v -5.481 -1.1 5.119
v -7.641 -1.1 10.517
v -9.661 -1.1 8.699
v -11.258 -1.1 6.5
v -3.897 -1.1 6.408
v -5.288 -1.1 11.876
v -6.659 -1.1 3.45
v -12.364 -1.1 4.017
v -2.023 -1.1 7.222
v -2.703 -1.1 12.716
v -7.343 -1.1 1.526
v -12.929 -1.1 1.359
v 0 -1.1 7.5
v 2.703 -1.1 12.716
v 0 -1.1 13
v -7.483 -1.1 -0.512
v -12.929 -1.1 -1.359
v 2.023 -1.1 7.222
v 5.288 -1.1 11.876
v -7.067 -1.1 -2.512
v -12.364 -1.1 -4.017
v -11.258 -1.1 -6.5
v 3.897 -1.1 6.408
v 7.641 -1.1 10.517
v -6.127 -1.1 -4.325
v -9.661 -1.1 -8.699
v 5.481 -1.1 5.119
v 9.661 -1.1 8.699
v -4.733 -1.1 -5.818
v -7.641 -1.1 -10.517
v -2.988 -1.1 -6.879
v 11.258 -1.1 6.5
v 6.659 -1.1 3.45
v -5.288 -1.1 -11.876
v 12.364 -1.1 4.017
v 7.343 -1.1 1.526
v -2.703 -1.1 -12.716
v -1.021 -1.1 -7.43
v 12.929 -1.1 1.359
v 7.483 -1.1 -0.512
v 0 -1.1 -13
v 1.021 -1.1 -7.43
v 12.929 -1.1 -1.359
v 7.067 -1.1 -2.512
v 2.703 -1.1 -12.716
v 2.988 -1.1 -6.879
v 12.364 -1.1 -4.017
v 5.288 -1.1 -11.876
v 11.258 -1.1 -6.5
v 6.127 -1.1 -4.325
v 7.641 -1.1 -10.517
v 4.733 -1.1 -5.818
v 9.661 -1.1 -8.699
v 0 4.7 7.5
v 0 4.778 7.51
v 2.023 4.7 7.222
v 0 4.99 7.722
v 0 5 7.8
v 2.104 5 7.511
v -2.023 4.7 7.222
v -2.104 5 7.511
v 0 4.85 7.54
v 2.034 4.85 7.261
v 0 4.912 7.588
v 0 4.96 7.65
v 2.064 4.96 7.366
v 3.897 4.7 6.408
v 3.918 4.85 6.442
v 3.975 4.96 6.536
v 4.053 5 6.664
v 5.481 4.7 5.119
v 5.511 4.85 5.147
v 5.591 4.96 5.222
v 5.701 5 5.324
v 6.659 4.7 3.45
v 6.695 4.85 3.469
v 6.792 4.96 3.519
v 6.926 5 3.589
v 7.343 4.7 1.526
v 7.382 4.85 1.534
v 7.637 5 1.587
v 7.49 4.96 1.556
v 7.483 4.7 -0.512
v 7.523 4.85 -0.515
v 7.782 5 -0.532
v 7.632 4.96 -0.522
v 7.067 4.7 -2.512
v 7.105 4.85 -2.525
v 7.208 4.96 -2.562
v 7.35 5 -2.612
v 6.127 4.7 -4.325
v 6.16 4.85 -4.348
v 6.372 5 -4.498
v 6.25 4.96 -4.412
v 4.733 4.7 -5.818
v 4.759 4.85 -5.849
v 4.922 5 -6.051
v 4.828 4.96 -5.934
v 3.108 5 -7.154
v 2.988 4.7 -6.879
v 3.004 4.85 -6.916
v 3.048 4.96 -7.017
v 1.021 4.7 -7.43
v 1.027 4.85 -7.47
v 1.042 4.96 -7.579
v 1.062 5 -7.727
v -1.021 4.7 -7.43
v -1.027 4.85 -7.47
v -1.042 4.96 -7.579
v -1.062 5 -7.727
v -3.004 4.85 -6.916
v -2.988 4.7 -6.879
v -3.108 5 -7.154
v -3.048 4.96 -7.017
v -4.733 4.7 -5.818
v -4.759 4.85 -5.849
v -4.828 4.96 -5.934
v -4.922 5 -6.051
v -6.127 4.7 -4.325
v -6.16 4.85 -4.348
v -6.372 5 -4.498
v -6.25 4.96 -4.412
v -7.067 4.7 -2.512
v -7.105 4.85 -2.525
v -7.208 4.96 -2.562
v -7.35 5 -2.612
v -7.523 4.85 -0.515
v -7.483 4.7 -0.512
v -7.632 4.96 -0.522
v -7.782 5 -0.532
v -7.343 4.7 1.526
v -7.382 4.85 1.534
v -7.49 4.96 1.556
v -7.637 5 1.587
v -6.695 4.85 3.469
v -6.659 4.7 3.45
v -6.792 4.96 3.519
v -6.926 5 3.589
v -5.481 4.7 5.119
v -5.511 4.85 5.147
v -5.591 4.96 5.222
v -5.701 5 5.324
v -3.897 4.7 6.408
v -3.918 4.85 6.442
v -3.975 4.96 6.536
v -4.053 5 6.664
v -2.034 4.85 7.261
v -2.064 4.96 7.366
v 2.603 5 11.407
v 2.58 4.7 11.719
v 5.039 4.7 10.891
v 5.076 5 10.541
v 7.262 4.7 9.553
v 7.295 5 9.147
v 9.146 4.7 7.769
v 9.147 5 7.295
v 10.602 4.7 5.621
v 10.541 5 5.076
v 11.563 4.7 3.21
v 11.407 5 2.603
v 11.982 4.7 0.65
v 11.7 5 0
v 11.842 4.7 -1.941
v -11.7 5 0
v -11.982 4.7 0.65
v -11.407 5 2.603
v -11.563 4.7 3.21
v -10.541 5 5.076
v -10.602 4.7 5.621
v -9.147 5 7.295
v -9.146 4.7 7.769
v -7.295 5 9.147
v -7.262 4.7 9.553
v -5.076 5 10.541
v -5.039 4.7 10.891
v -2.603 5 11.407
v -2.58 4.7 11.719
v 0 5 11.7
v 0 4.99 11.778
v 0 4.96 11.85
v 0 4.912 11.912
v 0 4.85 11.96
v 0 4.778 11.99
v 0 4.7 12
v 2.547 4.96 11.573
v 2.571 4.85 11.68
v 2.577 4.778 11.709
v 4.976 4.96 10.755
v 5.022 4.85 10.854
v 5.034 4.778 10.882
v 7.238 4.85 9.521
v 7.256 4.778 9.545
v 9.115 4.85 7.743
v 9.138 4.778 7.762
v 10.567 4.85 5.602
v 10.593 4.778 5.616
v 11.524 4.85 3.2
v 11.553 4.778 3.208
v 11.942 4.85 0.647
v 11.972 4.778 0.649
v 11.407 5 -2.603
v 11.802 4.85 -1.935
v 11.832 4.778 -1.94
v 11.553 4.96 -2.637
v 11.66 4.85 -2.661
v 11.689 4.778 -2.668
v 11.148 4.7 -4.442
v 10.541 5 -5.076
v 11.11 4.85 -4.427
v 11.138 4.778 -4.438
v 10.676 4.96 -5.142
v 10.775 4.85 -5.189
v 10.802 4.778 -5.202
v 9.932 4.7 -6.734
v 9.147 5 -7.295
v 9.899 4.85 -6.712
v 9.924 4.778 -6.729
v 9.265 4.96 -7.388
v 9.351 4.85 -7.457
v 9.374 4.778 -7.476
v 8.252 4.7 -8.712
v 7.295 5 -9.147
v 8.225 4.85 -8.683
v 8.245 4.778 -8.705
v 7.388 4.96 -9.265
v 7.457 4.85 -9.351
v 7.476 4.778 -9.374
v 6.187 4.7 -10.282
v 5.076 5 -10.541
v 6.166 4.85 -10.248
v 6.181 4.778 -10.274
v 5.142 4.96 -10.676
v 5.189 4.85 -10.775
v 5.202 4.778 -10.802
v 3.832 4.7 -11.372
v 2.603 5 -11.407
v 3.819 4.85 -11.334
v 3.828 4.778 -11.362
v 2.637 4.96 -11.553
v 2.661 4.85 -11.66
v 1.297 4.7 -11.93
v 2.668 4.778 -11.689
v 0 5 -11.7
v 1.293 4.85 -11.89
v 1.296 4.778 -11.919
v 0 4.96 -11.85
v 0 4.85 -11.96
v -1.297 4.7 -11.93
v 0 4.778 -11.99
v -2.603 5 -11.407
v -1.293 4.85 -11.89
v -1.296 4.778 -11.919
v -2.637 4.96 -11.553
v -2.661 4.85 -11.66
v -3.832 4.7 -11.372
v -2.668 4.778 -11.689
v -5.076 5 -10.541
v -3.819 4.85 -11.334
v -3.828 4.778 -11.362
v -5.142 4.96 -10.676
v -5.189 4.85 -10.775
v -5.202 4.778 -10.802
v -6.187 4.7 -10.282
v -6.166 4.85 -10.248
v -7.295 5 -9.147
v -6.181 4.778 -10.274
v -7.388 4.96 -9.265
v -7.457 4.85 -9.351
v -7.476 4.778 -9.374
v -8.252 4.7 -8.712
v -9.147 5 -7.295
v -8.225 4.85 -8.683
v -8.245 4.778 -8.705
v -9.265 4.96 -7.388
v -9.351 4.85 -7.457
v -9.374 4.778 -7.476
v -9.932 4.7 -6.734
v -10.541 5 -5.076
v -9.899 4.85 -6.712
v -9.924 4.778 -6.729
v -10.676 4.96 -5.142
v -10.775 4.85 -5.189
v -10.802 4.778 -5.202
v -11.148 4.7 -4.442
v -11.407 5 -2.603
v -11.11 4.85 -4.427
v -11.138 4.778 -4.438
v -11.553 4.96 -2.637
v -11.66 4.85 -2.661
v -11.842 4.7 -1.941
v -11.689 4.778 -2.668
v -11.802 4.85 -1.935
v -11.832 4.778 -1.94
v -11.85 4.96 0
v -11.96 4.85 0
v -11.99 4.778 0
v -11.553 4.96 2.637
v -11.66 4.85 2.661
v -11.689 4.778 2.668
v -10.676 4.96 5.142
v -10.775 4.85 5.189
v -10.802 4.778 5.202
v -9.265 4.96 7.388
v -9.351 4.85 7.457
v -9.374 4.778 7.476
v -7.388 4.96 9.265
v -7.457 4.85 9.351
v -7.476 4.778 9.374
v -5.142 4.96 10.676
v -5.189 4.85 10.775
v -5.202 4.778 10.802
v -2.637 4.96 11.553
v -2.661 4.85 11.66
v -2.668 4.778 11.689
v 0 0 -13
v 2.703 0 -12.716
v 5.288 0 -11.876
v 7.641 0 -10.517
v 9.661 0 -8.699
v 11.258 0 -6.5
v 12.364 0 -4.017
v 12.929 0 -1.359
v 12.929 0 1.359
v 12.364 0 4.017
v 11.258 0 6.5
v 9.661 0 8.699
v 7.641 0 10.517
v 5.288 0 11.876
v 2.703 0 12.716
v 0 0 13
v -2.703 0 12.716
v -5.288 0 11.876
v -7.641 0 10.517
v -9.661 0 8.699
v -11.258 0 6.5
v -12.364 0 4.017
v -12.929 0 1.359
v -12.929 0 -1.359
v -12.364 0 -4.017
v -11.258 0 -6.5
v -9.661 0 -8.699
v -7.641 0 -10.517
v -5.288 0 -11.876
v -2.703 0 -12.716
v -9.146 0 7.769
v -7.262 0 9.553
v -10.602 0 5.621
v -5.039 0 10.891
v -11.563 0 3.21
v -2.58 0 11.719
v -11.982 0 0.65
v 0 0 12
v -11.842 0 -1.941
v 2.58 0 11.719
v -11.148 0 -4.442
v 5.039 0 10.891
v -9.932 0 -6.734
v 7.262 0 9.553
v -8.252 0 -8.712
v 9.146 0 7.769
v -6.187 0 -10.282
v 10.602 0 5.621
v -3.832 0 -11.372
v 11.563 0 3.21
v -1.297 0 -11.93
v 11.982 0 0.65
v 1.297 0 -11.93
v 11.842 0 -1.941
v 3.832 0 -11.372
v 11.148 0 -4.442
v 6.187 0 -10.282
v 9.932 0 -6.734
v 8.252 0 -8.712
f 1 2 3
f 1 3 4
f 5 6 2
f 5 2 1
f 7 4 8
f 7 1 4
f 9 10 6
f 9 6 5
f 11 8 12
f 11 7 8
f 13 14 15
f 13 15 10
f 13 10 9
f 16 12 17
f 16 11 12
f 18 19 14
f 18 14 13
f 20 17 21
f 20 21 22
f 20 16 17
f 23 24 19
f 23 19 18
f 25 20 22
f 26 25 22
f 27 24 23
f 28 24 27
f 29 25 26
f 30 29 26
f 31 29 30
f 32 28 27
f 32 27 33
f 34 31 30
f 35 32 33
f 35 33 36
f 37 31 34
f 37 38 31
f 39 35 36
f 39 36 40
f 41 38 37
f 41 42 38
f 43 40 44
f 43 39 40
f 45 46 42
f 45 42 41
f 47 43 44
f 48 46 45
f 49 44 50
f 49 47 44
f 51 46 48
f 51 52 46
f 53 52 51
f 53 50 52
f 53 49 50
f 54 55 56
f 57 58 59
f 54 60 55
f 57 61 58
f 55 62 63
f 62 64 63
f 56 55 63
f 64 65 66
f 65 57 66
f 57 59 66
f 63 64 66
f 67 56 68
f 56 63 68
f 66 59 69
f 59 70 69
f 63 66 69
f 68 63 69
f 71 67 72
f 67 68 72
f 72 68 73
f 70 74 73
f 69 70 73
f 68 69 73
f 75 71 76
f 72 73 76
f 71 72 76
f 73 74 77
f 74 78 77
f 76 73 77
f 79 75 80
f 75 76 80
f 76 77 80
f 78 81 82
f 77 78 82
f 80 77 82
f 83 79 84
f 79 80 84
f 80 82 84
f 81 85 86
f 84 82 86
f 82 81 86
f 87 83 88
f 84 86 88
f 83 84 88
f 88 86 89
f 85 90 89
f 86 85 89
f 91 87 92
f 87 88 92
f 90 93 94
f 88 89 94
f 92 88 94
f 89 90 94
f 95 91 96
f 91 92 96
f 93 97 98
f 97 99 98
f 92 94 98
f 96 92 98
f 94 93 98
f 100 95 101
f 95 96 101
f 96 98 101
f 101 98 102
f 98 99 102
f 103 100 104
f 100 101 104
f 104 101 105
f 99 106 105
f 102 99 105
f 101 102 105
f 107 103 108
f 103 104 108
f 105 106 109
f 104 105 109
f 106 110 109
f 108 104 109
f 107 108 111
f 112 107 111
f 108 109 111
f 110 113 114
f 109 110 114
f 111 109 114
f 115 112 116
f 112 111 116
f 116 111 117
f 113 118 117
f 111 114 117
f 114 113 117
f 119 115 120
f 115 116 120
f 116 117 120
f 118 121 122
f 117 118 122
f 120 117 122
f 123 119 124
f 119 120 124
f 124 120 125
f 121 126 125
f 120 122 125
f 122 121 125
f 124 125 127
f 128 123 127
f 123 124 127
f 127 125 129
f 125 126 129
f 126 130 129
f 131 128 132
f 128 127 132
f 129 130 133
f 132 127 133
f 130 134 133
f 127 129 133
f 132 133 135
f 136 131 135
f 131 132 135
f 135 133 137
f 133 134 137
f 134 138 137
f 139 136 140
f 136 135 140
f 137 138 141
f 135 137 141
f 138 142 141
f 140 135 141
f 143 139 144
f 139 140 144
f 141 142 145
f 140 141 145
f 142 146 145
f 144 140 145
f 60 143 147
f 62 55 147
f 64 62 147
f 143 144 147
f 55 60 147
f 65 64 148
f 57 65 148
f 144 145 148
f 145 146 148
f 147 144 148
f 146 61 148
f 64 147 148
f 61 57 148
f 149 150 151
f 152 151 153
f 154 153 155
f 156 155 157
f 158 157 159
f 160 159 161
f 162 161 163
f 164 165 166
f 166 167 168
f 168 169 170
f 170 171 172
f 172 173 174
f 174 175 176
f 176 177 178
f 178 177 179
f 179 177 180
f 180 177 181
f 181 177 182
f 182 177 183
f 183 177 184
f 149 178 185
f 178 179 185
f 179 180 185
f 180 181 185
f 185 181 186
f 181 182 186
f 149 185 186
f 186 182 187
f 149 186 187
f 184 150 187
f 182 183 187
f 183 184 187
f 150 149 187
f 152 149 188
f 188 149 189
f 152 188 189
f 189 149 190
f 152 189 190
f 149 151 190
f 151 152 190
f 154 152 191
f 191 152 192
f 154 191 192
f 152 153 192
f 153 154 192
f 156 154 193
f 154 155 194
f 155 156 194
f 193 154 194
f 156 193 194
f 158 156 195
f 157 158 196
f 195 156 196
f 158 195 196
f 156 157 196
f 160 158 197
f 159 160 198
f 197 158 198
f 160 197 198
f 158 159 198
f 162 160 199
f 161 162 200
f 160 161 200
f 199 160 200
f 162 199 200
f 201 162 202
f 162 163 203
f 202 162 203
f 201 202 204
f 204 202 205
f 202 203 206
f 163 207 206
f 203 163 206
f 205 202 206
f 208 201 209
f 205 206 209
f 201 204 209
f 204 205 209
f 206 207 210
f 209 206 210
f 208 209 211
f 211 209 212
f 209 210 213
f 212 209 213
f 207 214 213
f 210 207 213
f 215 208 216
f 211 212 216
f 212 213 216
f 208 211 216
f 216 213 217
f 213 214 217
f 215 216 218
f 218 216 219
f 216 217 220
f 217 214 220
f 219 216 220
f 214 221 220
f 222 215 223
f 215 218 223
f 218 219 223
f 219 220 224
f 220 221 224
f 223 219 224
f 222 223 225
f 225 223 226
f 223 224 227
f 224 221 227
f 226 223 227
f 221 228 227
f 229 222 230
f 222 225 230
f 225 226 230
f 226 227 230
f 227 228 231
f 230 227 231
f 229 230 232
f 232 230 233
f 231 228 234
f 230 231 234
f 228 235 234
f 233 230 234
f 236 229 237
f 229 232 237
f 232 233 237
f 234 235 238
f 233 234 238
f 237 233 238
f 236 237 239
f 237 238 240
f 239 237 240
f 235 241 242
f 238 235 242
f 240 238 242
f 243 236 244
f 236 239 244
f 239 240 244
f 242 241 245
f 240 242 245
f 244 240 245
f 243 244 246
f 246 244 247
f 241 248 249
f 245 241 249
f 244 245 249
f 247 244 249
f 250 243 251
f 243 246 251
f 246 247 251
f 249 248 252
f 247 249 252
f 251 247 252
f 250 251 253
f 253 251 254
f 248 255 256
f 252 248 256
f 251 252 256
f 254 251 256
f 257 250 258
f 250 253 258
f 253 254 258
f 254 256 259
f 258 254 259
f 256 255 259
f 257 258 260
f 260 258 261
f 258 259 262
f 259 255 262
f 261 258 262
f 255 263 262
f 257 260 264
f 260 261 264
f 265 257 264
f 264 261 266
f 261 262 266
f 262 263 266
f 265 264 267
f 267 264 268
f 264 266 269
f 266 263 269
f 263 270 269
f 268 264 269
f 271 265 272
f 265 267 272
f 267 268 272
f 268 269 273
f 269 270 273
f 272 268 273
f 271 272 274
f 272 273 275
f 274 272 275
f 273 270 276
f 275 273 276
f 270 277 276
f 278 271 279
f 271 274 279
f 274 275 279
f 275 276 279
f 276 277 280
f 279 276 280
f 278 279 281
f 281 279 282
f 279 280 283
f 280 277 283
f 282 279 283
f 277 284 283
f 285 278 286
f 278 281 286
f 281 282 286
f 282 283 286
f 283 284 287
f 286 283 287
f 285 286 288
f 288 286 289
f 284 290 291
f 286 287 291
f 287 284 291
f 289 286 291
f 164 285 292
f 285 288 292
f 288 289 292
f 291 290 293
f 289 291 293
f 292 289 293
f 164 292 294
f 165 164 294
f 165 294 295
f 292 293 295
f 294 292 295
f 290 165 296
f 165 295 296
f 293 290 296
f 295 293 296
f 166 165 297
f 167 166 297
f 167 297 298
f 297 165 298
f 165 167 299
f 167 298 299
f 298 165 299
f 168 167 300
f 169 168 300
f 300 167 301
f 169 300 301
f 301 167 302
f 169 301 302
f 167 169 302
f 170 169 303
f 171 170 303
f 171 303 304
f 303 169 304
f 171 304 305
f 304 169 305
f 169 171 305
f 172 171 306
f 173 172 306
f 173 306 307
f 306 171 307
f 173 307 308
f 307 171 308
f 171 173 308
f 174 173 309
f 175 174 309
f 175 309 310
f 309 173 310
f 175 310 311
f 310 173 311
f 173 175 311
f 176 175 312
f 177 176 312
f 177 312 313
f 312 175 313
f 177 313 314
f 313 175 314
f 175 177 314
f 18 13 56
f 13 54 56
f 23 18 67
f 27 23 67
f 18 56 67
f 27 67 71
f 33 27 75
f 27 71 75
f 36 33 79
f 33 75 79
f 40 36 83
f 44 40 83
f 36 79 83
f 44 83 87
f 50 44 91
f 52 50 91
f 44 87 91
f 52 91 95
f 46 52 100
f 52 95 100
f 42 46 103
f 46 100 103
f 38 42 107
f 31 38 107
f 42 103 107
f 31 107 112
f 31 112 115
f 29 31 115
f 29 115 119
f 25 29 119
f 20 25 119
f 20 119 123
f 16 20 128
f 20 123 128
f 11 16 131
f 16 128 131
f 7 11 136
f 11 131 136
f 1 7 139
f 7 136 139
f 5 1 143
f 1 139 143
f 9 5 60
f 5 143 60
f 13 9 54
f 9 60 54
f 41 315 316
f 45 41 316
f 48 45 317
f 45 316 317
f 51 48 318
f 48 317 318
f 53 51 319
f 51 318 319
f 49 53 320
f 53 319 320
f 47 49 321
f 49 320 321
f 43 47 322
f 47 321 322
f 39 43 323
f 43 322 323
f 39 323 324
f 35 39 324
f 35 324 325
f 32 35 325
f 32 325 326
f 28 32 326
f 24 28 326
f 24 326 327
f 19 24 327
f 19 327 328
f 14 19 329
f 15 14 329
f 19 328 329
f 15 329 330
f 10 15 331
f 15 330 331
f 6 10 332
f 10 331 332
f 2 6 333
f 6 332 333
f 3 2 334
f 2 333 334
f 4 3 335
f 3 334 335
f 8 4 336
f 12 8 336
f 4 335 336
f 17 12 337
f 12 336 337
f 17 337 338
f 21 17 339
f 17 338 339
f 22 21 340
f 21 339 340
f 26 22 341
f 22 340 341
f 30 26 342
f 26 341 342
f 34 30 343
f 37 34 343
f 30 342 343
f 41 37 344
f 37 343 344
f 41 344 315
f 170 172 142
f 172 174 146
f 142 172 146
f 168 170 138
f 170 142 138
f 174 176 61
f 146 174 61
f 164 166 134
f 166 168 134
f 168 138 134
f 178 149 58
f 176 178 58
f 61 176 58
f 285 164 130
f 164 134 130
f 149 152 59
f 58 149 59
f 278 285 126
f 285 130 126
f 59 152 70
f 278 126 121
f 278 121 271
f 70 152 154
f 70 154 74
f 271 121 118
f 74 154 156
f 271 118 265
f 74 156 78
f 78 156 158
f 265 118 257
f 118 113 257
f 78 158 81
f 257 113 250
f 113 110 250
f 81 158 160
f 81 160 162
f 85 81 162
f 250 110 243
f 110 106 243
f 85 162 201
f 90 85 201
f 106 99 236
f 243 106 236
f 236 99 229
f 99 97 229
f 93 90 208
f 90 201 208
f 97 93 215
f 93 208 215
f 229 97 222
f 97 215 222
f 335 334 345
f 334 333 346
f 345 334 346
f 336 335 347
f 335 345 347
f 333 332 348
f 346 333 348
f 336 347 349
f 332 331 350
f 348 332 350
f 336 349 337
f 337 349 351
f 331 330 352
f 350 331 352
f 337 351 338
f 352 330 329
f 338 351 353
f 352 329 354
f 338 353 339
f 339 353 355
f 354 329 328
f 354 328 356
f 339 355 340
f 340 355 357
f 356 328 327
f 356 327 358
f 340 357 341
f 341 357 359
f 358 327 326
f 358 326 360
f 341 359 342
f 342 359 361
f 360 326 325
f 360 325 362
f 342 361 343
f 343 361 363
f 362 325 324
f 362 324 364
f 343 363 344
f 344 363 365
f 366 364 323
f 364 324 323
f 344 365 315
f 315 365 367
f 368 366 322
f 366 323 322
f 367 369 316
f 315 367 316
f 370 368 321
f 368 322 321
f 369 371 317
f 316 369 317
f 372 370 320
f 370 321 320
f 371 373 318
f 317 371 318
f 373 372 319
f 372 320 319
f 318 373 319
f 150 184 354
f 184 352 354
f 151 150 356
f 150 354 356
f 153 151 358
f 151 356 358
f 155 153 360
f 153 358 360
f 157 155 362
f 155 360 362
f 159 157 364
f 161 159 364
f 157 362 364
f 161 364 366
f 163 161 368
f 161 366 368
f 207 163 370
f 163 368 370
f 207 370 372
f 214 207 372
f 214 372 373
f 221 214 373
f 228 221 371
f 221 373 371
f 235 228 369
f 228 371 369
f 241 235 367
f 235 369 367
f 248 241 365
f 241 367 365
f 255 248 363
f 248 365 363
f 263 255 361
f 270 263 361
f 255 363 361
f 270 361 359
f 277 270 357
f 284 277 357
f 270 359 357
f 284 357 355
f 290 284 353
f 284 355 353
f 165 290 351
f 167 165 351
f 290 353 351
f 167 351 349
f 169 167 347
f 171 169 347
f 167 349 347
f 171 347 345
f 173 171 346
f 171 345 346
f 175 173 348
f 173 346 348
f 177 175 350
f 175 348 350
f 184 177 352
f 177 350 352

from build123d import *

# Parameters (mm, degrees)
SKETCH_2_R          = 13
EXTRUDE_1_DEPTH     = 1.1
CUT_EXTRUDE_1_REACH = 21.053
SKETCH_3_R          = 7.5


with BuildPart() as part:
    # 草图1 → 旋转1 (revolve)
    with BuildSketch(Plane(origin=(0, 0, 0), x_dir=(-1, 0, 0), z_dir=(0, 0, -1)), mode=Mode.PRIVATE) as revolve_1_sk:
        with BuildLine():
            Line((-11.7, 0), (-7.8, 0))
            Line((-7.8, 0), (-7.5, 0))
            Line((-7.5, 0), (-7.5, 0.3))
            Line((-7.5, 0.3), (-7.5, 4.7))
            ThreePointArc((-7.5, 4.7), (-7.587867966, 4.912132034), (-7.8, 5))
            Line((-7.8, 5), (-11.7, 5))
            ThreePointArc((-11.7, 5), (-11.912132034, 4.912132034), (-12, 4.7))
            Line((-12, 4.7), (-12, 0.3))
            Line((-12, 0.3), (-12, 0))
            Line((-12, 0), (-11.7, 0))
        make_face()
    revolve(revolve_1_sk.sketch.rotate(Axis((0, -0.001250002, 0), (0, 1, 0)), 270), axis=Axis((0, -0.001250002, 0), (0, 1, 0)))

    # 草图2 → 凸台-拉伸1 (add)
    with BuildSketch(Plane.XZ):
        with Locations(Location((0, 0, 0), (0, 0, 270))):
            Circle(SKETCH_2_R)
    extrude(amount=EXTRUDE_1_DEPTH)

    # 草图3 → 切除-拉伸1 (cut, up to next)
    with BuildSketch(Plane(origin=(0, 0, 0), x_dir=(1, 0, 0), z_dir=(0, 1, 0)), mode=Mode.PRIVATE) as cut_extrude_1_sk1:
        with Locations(Location((0, 0, 0), (0, 0, 270))):
            Circle(SKETCH_3_R)
    cut_extrude_1_tool1 = extrude(cut_extrude_1_sk1.sketch, amount=-CUT_EXTRUDE_1_REACH, mode=Mode.PRIVATE) & part.part
    add(cut_extrude_1_tool1.solids().sort_by_distance((0, 0, 0))[0], mode=Mode.SUBTRACT)


solid = part.part
